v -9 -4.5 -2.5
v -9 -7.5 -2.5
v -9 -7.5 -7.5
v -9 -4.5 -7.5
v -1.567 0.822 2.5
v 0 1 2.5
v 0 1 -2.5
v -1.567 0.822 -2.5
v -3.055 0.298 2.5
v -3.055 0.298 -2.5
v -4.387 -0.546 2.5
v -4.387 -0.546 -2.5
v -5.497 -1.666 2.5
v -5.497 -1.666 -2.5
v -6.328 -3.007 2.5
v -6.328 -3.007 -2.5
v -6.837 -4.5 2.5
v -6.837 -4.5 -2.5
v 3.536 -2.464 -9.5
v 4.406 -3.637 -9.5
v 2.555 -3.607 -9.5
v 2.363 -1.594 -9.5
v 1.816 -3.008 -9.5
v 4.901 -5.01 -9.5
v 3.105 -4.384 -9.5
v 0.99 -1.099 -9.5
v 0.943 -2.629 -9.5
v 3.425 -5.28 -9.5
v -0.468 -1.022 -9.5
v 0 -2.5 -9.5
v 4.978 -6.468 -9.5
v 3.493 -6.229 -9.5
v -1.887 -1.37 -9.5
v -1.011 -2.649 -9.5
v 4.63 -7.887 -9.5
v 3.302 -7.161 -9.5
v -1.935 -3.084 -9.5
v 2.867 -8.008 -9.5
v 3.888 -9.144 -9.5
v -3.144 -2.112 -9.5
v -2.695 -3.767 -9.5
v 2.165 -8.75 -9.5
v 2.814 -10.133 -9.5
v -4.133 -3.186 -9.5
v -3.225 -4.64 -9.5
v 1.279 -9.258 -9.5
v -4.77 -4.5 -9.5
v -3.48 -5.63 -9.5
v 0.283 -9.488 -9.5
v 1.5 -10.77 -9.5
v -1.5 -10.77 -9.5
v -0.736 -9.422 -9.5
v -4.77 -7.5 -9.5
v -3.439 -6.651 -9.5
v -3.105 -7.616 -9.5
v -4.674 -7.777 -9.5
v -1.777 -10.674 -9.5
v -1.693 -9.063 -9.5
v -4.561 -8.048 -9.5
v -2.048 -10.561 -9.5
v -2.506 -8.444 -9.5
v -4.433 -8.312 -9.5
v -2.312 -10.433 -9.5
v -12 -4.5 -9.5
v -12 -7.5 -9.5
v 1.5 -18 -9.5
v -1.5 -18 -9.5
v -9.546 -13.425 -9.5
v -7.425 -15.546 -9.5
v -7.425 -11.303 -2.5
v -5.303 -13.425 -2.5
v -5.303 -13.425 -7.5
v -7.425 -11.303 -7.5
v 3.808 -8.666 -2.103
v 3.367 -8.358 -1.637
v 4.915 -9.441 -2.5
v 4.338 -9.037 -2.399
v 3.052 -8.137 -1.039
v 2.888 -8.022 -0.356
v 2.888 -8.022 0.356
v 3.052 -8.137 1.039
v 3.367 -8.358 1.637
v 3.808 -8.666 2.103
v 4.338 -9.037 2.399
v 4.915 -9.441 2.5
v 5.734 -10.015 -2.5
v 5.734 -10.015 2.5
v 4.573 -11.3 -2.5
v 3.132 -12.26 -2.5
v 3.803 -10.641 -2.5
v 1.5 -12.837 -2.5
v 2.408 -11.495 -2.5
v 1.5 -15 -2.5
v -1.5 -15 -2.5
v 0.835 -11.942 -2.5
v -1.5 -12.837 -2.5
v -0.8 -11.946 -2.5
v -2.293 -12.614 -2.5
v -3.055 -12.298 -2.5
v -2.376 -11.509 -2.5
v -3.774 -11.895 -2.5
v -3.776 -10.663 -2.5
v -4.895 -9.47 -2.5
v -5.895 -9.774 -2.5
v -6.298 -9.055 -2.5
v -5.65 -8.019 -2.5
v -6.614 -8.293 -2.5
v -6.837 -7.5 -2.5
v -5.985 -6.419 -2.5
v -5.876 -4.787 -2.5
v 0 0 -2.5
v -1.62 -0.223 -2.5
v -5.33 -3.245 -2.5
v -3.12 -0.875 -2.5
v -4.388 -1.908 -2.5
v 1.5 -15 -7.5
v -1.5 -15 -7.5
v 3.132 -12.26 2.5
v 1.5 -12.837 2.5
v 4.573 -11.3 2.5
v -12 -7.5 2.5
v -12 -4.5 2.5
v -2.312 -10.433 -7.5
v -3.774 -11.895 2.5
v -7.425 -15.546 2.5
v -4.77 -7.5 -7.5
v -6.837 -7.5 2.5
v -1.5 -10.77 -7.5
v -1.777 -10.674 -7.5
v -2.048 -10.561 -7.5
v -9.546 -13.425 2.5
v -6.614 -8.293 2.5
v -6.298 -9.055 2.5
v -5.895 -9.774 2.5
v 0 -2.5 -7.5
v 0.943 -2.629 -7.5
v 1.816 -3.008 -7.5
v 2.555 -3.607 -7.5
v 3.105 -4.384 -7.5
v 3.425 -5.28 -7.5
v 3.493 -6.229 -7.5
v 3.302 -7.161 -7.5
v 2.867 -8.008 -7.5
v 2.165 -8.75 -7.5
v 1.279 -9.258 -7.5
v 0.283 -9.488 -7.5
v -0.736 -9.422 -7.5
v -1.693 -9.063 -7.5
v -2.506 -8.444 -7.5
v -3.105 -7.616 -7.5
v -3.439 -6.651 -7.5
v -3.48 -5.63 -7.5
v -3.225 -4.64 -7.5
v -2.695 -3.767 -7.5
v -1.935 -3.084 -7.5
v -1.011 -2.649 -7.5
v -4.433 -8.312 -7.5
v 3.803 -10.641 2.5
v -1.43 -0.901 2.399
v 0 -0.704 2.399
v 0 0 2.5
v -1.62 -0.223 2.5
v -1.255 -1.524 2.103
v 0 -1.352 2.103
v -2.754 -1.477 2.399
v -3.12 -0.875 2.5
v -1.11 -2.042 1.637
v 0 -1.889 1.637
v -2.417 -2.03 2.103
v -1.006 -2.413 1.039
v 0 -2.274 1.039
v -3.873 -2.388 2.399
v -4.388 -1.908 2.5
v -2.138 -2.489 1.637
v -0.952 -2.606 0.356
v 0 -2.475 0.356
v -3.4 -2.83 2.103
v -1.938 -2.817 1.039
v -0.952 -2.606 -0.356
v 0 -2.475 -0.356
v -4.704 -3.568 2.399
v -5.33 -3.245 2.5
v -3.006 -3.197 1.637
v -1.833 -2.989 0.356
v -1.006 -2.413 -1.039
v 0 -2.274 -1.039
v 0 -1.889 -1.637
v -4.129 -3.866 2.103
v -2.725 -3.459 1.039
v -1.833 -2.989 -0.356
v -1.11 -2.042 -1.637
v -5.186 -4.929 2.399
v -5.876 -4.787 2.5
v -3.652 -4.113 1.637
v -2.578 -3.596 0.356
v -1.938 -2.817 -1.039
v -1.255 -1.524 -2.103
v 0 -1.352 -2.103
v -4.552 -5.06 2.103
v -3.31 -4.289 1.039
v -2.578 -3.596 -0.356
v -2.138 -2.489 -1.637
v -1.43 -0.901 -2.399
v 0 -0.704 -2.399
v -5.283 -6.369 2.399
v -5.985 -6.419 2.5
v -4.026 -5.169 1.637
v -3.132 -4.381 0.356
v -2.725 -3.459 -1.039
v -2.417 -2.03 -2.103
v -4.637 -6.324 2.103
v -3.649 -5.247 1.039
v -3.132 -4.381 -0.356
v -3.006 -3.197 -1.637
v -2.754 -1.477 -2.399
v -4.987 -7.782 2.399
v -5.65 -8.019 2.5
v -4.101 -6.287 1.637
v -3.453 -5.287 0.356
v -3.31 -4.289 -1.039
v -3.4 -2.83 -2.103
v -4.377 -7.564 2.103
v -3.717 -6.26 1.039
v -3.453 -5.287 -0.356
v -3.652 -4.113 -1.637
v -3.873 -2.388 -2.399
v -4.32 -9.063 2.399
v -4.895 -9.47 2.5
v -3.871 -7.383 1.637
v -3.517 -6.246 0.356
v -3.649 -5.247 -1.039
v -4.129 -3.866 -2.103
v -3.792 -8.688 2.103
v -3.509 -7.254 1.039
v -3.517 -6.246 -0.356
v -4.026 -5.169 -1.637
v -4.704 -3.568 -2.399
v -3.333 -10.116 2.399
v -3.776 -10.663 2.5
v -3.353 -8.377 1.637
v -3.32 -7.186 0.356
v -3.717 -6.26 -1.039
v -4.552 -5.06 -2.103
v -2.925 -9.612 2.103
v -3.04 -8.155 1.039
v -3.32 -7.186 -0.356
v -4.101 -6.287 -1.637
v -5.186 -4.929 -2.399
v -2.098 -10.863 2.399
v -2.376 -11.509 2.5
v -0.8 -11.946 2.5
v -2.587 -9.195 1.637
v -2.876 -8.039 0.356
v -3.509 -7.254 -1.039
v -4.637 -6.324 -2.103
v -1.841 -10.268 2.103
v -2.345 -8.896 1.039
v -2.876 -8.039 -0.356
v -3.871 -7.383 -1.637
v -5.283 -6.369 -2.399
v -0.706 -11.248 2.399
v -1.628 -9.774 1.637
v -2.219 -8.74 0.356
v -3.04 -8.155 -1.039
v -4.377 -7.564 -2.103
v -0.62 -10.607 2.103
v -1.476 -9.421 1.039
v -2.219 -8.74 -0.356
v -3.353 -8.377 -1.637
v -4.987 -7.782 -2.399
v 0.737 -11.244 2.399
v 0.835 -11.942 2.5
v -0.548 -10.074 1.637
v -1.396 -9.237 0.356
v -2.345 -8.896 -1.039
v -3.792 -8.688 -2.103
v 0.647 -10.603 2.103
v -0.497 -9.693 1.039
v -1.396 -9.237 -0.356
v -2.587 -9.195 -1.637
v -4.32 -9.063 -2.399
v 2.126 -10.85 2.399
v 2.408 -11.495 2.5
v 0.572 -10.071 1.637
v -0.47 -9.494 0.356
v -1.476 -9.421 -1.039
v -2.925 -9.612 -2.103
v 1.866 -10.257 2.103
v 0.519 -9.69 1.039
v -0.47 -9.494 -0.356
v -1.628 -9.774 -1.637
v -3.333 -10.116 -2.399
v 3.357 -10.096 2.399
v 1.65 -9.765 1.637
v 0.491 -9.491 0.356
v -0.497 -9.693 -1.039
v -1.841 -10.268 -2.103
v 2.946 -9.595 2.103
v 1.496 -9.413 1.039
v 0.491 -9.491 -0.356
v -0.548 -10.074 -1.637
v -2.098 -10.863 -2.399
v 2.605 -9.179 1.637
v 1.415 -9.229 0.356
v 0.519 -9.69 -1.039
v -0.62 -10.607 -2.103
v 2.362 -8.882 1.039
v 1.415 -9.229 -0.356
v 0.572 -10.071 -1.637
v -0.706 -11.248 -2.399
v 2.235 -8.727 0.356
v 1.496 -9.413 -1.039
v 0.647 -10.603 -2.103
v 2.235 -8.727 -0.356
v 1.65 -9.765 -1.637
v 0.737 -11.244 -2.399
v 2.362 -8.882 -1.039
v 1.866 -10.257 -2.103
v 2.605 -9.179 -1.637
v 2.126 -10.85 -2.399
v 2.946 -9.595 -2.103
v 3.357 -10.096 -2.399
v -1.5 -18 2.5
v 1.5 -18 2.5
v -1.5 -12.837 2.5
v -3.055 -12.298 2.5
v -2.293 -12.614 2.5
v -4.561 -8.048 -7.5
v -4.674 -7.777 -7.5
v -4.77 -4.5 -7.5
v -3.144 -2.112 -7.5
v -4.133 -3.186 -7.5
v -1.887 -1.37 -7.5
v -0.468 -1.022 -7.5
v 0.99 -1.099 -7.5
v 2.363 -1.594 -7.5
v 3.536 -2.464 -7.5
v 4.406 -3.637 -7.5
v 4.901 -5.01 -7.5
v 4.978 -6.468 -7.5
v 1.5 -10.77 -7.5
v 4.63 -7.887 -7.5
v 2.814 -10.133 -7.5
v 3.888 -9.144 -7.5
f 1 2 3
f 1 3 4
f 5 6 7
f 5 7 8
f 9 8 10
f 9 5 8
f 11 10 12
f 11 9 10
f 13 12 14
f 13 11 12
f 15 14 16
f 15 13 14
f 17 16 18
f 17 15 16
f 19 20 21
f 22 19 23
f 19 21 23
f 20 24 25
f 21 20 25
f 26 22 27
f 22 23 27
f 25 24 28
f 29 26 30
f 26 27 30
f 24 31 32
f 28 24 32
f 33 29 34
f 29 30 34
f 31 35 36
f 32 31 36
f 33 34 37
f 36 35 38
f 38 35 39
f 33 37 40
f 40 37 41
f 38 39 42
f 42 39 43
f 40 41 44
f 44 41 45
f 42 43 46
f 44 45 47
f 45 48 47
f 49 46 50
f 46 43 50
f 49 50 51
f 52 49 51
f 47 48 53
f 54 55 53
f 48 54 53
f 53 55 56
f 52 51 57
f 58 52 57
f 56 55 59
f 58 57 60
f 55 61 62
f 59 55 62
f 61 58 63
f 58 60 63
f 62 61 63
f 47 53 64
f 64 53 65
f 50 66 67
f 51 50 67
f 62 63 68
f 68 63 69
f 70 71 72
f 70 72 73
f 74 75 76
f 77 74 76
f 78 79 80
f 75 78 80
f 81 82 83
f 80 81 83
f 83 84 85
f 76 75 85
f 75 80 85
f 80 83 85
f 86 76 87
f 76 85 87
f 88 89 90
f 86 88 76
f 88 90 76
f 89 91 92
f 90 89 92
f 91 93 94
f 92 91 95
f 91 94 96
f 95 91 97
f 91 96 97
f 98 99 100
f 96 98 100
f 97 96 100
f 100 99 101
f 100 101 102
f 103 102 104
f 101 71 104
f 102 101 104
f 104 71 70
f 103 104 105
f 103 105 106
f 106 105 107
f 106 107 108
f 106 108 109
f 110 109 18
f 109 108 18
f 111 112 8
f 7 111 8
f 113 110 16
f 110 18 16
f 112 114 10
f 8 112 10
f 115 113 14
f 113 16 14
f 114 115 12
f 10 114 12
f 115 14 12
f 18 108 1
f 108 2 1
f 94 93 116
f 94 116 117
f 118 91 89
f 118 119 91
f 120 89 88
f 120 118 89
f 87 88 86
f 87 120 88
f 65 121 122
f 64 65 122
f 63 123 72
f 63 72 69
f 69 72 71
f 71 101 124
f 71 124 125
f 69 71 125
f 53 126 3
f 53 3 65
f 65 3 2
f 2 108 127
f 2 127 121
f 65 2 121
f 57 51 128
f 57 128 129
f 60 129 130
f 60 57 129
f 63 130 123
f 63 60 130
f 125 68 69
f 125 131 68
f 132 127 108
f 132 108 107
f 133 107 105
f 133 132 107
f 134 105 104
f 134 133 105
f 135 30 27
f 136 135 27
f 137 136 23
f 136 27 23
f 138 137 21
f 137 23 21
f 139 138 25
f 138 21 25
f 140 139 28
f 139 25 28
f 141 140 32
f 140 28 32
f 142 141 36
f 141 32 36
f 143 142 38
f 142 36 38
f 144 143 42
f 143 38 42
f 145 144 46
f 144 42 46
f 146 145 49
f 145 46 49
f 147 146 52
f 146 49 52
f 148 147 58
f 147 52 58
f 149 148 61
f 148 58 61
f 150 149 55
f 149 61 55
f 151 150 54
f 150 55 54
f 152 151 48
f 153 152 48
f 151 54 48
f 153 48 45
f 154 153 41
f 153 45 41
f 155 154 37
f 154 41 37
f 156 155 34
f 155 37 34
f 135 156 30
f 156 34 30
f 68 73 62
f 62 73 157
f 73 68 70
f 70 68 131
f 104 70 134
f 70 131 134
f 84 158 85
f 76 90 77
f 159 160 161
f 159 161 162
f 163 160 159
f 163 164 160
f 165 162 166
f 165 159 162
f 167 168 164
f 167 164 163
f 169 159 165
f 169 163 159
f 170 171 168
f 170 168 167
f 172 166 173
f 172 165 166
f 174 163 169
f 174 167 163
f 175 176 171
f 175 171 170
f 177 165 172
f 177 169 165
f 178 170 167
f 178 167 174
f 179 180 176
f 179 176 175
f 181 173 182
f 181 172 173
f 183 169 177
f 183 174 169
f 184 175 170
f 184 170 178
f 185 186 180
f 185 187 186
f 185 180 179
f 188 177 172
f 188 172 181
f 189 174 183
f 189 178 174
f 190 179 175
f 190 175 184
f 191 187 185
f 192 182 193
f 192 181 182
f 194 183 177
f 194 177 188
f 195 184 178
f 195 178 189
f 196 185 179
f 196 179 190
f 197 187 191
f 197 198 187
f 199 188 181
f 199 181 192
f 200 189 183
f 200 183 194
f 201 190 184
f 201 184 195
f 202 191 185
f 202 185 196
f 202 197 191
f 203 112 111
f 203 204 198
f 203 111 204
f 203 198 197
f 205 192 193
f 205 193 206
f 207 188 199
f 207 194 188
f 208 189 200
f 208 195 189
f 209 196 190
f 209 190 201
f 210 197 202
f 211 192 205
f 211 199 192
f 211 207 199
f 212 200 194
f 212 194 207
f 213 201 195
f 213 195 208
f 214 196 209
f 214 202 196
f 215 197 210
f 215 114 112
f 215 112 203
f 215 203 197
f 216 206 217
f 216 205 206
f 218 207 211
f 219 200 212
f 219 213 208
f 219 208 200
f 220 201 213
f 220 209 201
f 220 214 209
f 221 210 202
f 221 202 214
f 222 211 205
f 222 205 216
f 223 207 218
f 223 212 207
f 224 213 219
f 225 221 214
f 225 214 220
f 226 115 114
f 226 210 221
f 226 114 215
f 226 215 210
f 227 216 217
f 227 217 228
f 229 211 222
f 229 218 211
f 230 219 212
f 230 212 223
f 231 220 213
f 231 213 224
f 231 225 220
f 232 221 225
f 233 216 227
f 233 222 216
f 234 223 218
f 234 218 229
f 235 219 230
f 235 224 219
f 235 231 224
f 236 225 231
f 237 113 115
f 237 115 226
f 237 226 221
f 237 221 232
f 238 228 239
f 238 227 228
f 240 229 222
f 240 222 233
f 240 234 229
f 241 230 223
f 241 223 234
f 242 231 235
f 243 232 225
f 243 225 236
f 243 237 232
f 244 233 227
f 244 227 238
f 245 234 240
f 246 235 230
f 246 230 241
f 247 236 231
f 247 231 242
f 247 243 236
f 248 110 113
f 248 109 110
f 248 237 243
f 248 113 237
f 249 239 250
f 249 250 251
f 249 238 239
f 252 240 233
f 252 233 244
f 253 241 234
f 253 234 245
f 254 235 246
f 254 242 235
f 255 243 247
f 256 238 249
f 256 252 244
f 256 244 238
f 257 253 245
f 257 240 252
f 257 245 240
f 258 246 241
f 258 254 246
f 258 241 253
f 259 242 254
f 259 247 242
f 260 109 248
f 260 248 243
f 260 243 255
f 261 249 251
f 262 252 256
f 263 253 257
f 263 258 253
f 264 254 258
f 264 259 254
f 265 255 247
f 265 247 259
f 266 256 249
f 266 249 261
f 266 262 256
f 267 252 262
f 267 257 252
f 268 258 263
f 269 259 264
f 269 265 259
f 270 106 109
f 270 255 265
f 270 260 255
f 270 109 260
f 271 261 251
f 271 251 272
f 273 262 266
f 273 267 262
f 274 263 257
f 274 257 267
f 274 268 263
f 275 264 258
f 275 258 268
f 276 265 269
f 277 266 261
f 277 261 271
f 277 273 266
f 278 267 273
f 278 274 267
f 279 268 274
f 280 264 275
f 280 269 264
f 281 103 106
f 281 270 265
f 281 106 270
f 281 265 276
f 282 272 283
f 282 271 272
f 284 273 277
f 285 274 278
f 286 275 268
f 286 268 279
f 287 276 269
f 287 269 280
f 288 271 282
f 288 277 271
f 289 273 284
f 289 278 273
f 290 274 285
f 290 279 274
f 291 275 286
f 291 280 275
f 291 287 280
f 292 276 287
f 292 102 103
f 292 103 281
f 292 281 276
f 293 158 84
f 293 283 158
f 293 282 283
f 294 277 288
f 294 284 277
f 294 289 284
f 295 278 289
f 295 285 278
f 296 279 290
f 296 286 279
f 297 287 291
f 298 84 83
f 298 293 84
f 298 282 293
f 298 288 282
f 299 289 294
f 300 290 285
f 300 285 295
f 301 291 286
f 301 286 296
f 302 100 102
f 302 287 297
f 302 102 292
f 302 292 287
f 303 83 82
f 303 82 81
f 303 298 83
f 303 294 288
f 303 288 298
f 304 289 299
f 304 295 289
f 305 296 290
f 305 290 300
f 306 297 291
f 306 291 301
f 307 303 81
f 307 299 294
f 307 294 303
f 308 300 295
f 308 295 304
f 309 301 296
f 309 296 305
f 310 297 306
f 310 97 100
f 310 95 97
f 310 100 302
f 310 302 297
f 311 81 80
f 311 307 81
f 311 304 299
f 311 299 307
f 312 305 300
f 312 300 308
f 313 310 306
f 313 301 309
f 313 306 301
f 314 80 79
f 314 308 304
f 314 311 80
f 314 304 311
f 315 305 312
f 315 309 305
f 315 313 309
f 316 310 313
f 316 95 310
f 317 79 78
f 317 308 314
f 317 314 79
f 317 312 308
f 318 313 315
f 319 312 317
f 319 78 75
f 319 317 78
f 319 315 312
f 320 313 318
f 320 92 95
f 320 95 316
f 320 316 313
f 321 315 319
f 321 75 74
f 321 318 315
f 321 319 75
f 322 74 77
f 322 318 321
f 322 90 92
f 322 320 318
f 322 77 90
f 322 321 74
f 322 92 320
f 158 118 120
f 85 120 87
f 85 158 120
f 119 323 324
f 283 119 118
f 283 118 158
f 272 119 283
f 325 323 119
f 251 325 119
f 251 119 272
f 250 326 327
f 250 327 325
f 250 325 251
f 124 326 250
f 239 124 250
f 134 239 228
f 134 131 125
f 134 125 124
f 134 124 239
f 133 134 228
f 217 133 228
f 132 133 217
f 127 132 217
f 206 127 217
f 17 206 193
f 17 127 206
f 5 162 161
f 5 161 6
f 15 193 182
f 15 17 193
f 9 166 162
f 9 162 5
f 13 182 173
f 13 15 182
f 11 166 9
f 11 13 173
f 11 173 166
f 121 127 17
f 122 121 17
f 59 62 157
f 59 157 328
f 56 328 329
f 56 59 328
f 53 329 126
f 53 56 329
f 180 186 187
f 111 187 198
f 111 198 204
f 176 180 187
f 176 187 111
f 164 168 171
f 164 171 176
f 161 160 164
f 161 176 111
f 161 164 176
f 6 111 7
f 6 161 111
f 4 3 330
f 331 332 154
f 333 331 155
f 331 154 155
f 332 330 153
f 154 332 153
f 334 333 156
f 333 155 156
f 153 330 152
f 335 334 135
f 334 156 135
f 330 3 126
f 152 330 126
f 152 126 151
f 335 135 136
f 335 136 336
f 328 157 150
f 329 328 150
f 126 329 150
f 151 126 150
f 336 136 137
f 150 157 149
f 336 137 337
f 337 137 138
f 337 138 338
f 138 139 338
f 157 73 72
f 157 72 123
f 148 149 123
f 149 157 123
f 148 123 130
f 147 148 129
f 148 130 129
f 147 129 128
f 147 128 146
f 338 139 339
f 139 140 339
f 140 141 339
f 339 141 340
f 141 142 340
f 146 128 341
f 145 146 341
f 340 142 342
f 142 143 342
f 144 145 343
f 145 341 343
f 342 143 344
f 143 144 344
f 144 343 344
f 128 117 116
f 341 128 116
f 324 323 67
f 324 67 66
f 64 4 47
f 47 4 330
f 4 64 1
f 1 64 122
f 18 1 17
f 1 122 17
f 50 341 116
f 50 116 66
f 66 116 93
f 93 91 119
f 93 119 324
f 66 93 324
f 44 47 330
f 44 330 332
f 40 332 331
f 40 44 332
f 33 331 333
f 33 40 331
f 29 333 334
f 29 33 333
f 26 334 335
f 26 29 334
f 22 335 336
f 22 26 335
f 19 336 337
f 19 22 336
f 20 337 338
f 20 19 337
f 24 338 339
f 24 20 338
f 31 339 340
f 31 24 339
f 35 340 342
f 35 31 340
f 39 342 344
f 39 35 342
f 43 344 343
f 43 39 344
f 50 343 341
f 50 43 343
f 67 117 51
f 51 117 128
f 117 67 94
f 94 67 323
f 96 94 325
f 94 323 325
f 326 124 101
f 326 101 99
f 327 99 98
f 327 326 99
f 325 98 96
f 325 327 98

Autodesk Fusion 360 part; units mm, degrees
sketch "Sketch1" plane through (0, 0, 0) normal (1, 0, 0) x (0, 1, 0)
  line L0 (0, -2.5) -> (1, -2.5)
  line L1 (1, -2.5) -> (1, 2.5)
  line L2 (1, 2.5) -> (0, 2.5)
  arc A0 (0, 2.5) -> (0, -2.5) centre (0, 0) ccw
  line L3 (-6, 5) -> (-6, -5)
  dimension "d1" = 5
  dimension "d2" = 1
  dimension "d3" = 5
  dimension "d4" = 6
revolve "Revolve1" add sketch "Sketch1" angle 235 about axis through (0, -6, 5) along (0, 0, 1) makes body 1
sketch "Sketch2" plane through (0, 0, 2.5) normal (0, 0, 1) x (-1, 0, 0)
  line L0 (0, 0) -> (0, -1)
  arc A0 (0, -1) -> (-5.7341, 10.015) centre (0, 6) ccw
  line L1 (-5.7341, 10.015) -> (-4.9149, 9.4415)
  arc A1 (0, 0) -> (-4.9149, 9.4415) centre (0, 6) ccw
  line L2 (6, 7.5) -> (12, 7.5)
  line L3 (12, 7.5) -> (12, 4.5)
  line L4 (12, 4.5) -> (6, 4.5)
  line L5 (6, 4.5) -> (6, 7.5)
  line L6 (12, 7.5) -> (9, 7.5)
  line L7 (9, 7.5) -> (9, 4.5)
  line L8 (9, 4.5) -> (12, 4.5)
  line L9 (12, 4.5) -> (12, 7.5)
  line L10 (7.4246, 15.5459) -> (5.3033, 13.4246)
  line L11 (5.3033, 13.4246) -> (7.4246, 11.3033)
  line L12 (9.5459, 13.4246) -> (7.4246, 15.5459)
  line L13 (7.4246, 11.3033) -> (9.5459, 13.4246)
  line L14 (7.4246, 15.5459) -> (9.5459, 13.4246)
  line L15 (5.3033, 9.182) -> (3.182, 11.3033)
  line L16 (3.182, 11.3033) -> (7.4246, 15.5459)
  line L17 (9.5459, 13.4246) -> (5.3033, 9.182)
  line L18 (-1.5, 18) -> (-1.5, 15)
  line L19 (-1.5, 15) -> (1.5, 15)
  line L20 (1.5, 18) -> (-1.5, 18)
  line L21 (1.5, 15) -> (1.5, 18)
  line L22 (-1.5, 18) -> (1.5, 18)
  line L23 (1.5, 12) -> (-1.5, 12)
  line L24 (-1.5, 12) -> (-1.5, 18)
  line L25 (1.5, 18) -> (1.5, 12)
  dimension "d6" = 6
  dimension "d7" = 3
  dimension "d8" = 12
  dimension "d9" = 1.5
  dimension "d10" = 3
  dimension "d11" = 3
  dimension "d13" = 90
extrude "Extrude1" add sketch "Sketch2" against normal blind 12 separate body contours L2 L3 L4 L6 L7 L8 L9 | L10 L11 L12 L13 L14 L16 L17 | L18 L19 L20 L21 L22 L24 L25 makes body 2 at (-6.0104, -14.1317, -5.5) makes body 3 at (0.5, -15, -1.5) makes body 4 at (-9, -6.5, -1.5)
extrude "Extrude2" add sketch "Sketch2" against normal blind 5 contours A0 L2 L4 L7 | A0 L11 L16 L17 | A0 L19 L24 L25 bodies 1 2 3 4
sketch "Sketch3" plane through (0, 0, -9.5) normal (0, 0, -1) x (1, 0, 0)
  line L0 (-1.5, 15) -> (1.5, 15)
  line L1 (1.5, 15) -> (1.5, 18)
  line L2 (1.5, 18) -> (-1.5, 18)
  line L3 (-1.5, 18) -> (-1.5, 15)
  line L4 (-12, 7.5) -> (-6.8374, 7.5)
  line L5 (-6.8374, 4.5) -> (-12, 4.5)
  line L6 (-12, 4.5) -> (-12, 7.5)
  arc A0 (-6.8374, 4.5) -> (0, -1) centre (0, 6) ccw
  line L7 (-1.5, 18) -> (-1.5, 12.8374)
  line L8 (1.5, 18) -> (-1.5, 18)
  line L9 (1.5, 12.8374) -> (1.5, 18)
  arc A1 (-1.5, 12.8374) -> (-3.7741, 11.8954) centre (0, 6) ccw
  line L10 (-9.5459, 13.4246) -> (-5.8954, 9.7741)
  line L11 (-7.4246, 15.5459) -> (-9.5459, 13.4246)
  line L12 (-3.7741, 11.8954) -> (-7.4246, 15.5459)
  arc A2 (-5.8954, 9.7741) -> (-6.8374, 7.5) centre (0, 6) ccw
  arc A3 (5.7341, 10.015) -> (1.5, 12.8374) centre (0, 6) ccw
  line L13 (0, -1) -> (0, 0)
  line L14 (4.9149, 9.4415) -> (5.7341, 10.015)
  line L15 (0, 0) -> (0, 2.5)
  line L16 (2.867, 8.0075) -> (4.9149, 9.4415)
  arc A4 (2.867, 8.0075) -> (0, 2.5) centre (0, 6) ccw
  circle A5 centre (0, 6) radius 3.5
  circle A6 centre (0, 6) radius 5
  line L17 (1.5, 12.8374) -> (-1.5, 12.8374)
  line L18 (-1.5, 12.8374) -> (-1.5, 9.8374)
  line L19 (-1.5, 9.8374) -> (1.5, 9.8374)
  line L20 (1.5, 9.8374) -> (1.5, 12.8374)
  line L21 (-3.7741, 7.6528) -> (-1.6528, 9.7741)
  line L22 (-1.6528, 9.7741) -> (-3.7741, 11.8954)
  line L23 (-5.8954, 9.7741) -> (-3.7741, 7.6528)
  line L24 (-3.7741, 11.8954) -> (-5.8954, 9.7741)
  line L25 (-3.8374, 4.5) -> (-3.8374, 7.5)
  line L26 (-3.8374, 7.5) -> (-6.8374, 7.5)
  line L27 (-6.8374, 4.5) -> (-3.8374, 4.5)
  line L28 (-6.8374, 7.5) -> (-6.8374, 4.5)
  dimension "d18" = 7
  dimension "d19" = 10
  dimension "d20" = 3
  dimension "d21" = 3
  dimension "d23" = 90
extrude "Extrude3" add sketch "Sketch3" against normal blind 2 contours L0 L7 L9 L17 | A6 L17 L18 L20 | L10 L11 L12 L24 | A6 L22 L23 L24 | L15 L16 A4 A5 A6 L18 L19 L20 L21 L22 L23 L25 L26 L27 | A6 L18 L19 L20 | A6 L21 L22 L23 | L15 L16 A5 A6 | L4 L5 L6 L28 | A6 L26 L27 L28 | A6 L25 L26 L27 bodies 1
